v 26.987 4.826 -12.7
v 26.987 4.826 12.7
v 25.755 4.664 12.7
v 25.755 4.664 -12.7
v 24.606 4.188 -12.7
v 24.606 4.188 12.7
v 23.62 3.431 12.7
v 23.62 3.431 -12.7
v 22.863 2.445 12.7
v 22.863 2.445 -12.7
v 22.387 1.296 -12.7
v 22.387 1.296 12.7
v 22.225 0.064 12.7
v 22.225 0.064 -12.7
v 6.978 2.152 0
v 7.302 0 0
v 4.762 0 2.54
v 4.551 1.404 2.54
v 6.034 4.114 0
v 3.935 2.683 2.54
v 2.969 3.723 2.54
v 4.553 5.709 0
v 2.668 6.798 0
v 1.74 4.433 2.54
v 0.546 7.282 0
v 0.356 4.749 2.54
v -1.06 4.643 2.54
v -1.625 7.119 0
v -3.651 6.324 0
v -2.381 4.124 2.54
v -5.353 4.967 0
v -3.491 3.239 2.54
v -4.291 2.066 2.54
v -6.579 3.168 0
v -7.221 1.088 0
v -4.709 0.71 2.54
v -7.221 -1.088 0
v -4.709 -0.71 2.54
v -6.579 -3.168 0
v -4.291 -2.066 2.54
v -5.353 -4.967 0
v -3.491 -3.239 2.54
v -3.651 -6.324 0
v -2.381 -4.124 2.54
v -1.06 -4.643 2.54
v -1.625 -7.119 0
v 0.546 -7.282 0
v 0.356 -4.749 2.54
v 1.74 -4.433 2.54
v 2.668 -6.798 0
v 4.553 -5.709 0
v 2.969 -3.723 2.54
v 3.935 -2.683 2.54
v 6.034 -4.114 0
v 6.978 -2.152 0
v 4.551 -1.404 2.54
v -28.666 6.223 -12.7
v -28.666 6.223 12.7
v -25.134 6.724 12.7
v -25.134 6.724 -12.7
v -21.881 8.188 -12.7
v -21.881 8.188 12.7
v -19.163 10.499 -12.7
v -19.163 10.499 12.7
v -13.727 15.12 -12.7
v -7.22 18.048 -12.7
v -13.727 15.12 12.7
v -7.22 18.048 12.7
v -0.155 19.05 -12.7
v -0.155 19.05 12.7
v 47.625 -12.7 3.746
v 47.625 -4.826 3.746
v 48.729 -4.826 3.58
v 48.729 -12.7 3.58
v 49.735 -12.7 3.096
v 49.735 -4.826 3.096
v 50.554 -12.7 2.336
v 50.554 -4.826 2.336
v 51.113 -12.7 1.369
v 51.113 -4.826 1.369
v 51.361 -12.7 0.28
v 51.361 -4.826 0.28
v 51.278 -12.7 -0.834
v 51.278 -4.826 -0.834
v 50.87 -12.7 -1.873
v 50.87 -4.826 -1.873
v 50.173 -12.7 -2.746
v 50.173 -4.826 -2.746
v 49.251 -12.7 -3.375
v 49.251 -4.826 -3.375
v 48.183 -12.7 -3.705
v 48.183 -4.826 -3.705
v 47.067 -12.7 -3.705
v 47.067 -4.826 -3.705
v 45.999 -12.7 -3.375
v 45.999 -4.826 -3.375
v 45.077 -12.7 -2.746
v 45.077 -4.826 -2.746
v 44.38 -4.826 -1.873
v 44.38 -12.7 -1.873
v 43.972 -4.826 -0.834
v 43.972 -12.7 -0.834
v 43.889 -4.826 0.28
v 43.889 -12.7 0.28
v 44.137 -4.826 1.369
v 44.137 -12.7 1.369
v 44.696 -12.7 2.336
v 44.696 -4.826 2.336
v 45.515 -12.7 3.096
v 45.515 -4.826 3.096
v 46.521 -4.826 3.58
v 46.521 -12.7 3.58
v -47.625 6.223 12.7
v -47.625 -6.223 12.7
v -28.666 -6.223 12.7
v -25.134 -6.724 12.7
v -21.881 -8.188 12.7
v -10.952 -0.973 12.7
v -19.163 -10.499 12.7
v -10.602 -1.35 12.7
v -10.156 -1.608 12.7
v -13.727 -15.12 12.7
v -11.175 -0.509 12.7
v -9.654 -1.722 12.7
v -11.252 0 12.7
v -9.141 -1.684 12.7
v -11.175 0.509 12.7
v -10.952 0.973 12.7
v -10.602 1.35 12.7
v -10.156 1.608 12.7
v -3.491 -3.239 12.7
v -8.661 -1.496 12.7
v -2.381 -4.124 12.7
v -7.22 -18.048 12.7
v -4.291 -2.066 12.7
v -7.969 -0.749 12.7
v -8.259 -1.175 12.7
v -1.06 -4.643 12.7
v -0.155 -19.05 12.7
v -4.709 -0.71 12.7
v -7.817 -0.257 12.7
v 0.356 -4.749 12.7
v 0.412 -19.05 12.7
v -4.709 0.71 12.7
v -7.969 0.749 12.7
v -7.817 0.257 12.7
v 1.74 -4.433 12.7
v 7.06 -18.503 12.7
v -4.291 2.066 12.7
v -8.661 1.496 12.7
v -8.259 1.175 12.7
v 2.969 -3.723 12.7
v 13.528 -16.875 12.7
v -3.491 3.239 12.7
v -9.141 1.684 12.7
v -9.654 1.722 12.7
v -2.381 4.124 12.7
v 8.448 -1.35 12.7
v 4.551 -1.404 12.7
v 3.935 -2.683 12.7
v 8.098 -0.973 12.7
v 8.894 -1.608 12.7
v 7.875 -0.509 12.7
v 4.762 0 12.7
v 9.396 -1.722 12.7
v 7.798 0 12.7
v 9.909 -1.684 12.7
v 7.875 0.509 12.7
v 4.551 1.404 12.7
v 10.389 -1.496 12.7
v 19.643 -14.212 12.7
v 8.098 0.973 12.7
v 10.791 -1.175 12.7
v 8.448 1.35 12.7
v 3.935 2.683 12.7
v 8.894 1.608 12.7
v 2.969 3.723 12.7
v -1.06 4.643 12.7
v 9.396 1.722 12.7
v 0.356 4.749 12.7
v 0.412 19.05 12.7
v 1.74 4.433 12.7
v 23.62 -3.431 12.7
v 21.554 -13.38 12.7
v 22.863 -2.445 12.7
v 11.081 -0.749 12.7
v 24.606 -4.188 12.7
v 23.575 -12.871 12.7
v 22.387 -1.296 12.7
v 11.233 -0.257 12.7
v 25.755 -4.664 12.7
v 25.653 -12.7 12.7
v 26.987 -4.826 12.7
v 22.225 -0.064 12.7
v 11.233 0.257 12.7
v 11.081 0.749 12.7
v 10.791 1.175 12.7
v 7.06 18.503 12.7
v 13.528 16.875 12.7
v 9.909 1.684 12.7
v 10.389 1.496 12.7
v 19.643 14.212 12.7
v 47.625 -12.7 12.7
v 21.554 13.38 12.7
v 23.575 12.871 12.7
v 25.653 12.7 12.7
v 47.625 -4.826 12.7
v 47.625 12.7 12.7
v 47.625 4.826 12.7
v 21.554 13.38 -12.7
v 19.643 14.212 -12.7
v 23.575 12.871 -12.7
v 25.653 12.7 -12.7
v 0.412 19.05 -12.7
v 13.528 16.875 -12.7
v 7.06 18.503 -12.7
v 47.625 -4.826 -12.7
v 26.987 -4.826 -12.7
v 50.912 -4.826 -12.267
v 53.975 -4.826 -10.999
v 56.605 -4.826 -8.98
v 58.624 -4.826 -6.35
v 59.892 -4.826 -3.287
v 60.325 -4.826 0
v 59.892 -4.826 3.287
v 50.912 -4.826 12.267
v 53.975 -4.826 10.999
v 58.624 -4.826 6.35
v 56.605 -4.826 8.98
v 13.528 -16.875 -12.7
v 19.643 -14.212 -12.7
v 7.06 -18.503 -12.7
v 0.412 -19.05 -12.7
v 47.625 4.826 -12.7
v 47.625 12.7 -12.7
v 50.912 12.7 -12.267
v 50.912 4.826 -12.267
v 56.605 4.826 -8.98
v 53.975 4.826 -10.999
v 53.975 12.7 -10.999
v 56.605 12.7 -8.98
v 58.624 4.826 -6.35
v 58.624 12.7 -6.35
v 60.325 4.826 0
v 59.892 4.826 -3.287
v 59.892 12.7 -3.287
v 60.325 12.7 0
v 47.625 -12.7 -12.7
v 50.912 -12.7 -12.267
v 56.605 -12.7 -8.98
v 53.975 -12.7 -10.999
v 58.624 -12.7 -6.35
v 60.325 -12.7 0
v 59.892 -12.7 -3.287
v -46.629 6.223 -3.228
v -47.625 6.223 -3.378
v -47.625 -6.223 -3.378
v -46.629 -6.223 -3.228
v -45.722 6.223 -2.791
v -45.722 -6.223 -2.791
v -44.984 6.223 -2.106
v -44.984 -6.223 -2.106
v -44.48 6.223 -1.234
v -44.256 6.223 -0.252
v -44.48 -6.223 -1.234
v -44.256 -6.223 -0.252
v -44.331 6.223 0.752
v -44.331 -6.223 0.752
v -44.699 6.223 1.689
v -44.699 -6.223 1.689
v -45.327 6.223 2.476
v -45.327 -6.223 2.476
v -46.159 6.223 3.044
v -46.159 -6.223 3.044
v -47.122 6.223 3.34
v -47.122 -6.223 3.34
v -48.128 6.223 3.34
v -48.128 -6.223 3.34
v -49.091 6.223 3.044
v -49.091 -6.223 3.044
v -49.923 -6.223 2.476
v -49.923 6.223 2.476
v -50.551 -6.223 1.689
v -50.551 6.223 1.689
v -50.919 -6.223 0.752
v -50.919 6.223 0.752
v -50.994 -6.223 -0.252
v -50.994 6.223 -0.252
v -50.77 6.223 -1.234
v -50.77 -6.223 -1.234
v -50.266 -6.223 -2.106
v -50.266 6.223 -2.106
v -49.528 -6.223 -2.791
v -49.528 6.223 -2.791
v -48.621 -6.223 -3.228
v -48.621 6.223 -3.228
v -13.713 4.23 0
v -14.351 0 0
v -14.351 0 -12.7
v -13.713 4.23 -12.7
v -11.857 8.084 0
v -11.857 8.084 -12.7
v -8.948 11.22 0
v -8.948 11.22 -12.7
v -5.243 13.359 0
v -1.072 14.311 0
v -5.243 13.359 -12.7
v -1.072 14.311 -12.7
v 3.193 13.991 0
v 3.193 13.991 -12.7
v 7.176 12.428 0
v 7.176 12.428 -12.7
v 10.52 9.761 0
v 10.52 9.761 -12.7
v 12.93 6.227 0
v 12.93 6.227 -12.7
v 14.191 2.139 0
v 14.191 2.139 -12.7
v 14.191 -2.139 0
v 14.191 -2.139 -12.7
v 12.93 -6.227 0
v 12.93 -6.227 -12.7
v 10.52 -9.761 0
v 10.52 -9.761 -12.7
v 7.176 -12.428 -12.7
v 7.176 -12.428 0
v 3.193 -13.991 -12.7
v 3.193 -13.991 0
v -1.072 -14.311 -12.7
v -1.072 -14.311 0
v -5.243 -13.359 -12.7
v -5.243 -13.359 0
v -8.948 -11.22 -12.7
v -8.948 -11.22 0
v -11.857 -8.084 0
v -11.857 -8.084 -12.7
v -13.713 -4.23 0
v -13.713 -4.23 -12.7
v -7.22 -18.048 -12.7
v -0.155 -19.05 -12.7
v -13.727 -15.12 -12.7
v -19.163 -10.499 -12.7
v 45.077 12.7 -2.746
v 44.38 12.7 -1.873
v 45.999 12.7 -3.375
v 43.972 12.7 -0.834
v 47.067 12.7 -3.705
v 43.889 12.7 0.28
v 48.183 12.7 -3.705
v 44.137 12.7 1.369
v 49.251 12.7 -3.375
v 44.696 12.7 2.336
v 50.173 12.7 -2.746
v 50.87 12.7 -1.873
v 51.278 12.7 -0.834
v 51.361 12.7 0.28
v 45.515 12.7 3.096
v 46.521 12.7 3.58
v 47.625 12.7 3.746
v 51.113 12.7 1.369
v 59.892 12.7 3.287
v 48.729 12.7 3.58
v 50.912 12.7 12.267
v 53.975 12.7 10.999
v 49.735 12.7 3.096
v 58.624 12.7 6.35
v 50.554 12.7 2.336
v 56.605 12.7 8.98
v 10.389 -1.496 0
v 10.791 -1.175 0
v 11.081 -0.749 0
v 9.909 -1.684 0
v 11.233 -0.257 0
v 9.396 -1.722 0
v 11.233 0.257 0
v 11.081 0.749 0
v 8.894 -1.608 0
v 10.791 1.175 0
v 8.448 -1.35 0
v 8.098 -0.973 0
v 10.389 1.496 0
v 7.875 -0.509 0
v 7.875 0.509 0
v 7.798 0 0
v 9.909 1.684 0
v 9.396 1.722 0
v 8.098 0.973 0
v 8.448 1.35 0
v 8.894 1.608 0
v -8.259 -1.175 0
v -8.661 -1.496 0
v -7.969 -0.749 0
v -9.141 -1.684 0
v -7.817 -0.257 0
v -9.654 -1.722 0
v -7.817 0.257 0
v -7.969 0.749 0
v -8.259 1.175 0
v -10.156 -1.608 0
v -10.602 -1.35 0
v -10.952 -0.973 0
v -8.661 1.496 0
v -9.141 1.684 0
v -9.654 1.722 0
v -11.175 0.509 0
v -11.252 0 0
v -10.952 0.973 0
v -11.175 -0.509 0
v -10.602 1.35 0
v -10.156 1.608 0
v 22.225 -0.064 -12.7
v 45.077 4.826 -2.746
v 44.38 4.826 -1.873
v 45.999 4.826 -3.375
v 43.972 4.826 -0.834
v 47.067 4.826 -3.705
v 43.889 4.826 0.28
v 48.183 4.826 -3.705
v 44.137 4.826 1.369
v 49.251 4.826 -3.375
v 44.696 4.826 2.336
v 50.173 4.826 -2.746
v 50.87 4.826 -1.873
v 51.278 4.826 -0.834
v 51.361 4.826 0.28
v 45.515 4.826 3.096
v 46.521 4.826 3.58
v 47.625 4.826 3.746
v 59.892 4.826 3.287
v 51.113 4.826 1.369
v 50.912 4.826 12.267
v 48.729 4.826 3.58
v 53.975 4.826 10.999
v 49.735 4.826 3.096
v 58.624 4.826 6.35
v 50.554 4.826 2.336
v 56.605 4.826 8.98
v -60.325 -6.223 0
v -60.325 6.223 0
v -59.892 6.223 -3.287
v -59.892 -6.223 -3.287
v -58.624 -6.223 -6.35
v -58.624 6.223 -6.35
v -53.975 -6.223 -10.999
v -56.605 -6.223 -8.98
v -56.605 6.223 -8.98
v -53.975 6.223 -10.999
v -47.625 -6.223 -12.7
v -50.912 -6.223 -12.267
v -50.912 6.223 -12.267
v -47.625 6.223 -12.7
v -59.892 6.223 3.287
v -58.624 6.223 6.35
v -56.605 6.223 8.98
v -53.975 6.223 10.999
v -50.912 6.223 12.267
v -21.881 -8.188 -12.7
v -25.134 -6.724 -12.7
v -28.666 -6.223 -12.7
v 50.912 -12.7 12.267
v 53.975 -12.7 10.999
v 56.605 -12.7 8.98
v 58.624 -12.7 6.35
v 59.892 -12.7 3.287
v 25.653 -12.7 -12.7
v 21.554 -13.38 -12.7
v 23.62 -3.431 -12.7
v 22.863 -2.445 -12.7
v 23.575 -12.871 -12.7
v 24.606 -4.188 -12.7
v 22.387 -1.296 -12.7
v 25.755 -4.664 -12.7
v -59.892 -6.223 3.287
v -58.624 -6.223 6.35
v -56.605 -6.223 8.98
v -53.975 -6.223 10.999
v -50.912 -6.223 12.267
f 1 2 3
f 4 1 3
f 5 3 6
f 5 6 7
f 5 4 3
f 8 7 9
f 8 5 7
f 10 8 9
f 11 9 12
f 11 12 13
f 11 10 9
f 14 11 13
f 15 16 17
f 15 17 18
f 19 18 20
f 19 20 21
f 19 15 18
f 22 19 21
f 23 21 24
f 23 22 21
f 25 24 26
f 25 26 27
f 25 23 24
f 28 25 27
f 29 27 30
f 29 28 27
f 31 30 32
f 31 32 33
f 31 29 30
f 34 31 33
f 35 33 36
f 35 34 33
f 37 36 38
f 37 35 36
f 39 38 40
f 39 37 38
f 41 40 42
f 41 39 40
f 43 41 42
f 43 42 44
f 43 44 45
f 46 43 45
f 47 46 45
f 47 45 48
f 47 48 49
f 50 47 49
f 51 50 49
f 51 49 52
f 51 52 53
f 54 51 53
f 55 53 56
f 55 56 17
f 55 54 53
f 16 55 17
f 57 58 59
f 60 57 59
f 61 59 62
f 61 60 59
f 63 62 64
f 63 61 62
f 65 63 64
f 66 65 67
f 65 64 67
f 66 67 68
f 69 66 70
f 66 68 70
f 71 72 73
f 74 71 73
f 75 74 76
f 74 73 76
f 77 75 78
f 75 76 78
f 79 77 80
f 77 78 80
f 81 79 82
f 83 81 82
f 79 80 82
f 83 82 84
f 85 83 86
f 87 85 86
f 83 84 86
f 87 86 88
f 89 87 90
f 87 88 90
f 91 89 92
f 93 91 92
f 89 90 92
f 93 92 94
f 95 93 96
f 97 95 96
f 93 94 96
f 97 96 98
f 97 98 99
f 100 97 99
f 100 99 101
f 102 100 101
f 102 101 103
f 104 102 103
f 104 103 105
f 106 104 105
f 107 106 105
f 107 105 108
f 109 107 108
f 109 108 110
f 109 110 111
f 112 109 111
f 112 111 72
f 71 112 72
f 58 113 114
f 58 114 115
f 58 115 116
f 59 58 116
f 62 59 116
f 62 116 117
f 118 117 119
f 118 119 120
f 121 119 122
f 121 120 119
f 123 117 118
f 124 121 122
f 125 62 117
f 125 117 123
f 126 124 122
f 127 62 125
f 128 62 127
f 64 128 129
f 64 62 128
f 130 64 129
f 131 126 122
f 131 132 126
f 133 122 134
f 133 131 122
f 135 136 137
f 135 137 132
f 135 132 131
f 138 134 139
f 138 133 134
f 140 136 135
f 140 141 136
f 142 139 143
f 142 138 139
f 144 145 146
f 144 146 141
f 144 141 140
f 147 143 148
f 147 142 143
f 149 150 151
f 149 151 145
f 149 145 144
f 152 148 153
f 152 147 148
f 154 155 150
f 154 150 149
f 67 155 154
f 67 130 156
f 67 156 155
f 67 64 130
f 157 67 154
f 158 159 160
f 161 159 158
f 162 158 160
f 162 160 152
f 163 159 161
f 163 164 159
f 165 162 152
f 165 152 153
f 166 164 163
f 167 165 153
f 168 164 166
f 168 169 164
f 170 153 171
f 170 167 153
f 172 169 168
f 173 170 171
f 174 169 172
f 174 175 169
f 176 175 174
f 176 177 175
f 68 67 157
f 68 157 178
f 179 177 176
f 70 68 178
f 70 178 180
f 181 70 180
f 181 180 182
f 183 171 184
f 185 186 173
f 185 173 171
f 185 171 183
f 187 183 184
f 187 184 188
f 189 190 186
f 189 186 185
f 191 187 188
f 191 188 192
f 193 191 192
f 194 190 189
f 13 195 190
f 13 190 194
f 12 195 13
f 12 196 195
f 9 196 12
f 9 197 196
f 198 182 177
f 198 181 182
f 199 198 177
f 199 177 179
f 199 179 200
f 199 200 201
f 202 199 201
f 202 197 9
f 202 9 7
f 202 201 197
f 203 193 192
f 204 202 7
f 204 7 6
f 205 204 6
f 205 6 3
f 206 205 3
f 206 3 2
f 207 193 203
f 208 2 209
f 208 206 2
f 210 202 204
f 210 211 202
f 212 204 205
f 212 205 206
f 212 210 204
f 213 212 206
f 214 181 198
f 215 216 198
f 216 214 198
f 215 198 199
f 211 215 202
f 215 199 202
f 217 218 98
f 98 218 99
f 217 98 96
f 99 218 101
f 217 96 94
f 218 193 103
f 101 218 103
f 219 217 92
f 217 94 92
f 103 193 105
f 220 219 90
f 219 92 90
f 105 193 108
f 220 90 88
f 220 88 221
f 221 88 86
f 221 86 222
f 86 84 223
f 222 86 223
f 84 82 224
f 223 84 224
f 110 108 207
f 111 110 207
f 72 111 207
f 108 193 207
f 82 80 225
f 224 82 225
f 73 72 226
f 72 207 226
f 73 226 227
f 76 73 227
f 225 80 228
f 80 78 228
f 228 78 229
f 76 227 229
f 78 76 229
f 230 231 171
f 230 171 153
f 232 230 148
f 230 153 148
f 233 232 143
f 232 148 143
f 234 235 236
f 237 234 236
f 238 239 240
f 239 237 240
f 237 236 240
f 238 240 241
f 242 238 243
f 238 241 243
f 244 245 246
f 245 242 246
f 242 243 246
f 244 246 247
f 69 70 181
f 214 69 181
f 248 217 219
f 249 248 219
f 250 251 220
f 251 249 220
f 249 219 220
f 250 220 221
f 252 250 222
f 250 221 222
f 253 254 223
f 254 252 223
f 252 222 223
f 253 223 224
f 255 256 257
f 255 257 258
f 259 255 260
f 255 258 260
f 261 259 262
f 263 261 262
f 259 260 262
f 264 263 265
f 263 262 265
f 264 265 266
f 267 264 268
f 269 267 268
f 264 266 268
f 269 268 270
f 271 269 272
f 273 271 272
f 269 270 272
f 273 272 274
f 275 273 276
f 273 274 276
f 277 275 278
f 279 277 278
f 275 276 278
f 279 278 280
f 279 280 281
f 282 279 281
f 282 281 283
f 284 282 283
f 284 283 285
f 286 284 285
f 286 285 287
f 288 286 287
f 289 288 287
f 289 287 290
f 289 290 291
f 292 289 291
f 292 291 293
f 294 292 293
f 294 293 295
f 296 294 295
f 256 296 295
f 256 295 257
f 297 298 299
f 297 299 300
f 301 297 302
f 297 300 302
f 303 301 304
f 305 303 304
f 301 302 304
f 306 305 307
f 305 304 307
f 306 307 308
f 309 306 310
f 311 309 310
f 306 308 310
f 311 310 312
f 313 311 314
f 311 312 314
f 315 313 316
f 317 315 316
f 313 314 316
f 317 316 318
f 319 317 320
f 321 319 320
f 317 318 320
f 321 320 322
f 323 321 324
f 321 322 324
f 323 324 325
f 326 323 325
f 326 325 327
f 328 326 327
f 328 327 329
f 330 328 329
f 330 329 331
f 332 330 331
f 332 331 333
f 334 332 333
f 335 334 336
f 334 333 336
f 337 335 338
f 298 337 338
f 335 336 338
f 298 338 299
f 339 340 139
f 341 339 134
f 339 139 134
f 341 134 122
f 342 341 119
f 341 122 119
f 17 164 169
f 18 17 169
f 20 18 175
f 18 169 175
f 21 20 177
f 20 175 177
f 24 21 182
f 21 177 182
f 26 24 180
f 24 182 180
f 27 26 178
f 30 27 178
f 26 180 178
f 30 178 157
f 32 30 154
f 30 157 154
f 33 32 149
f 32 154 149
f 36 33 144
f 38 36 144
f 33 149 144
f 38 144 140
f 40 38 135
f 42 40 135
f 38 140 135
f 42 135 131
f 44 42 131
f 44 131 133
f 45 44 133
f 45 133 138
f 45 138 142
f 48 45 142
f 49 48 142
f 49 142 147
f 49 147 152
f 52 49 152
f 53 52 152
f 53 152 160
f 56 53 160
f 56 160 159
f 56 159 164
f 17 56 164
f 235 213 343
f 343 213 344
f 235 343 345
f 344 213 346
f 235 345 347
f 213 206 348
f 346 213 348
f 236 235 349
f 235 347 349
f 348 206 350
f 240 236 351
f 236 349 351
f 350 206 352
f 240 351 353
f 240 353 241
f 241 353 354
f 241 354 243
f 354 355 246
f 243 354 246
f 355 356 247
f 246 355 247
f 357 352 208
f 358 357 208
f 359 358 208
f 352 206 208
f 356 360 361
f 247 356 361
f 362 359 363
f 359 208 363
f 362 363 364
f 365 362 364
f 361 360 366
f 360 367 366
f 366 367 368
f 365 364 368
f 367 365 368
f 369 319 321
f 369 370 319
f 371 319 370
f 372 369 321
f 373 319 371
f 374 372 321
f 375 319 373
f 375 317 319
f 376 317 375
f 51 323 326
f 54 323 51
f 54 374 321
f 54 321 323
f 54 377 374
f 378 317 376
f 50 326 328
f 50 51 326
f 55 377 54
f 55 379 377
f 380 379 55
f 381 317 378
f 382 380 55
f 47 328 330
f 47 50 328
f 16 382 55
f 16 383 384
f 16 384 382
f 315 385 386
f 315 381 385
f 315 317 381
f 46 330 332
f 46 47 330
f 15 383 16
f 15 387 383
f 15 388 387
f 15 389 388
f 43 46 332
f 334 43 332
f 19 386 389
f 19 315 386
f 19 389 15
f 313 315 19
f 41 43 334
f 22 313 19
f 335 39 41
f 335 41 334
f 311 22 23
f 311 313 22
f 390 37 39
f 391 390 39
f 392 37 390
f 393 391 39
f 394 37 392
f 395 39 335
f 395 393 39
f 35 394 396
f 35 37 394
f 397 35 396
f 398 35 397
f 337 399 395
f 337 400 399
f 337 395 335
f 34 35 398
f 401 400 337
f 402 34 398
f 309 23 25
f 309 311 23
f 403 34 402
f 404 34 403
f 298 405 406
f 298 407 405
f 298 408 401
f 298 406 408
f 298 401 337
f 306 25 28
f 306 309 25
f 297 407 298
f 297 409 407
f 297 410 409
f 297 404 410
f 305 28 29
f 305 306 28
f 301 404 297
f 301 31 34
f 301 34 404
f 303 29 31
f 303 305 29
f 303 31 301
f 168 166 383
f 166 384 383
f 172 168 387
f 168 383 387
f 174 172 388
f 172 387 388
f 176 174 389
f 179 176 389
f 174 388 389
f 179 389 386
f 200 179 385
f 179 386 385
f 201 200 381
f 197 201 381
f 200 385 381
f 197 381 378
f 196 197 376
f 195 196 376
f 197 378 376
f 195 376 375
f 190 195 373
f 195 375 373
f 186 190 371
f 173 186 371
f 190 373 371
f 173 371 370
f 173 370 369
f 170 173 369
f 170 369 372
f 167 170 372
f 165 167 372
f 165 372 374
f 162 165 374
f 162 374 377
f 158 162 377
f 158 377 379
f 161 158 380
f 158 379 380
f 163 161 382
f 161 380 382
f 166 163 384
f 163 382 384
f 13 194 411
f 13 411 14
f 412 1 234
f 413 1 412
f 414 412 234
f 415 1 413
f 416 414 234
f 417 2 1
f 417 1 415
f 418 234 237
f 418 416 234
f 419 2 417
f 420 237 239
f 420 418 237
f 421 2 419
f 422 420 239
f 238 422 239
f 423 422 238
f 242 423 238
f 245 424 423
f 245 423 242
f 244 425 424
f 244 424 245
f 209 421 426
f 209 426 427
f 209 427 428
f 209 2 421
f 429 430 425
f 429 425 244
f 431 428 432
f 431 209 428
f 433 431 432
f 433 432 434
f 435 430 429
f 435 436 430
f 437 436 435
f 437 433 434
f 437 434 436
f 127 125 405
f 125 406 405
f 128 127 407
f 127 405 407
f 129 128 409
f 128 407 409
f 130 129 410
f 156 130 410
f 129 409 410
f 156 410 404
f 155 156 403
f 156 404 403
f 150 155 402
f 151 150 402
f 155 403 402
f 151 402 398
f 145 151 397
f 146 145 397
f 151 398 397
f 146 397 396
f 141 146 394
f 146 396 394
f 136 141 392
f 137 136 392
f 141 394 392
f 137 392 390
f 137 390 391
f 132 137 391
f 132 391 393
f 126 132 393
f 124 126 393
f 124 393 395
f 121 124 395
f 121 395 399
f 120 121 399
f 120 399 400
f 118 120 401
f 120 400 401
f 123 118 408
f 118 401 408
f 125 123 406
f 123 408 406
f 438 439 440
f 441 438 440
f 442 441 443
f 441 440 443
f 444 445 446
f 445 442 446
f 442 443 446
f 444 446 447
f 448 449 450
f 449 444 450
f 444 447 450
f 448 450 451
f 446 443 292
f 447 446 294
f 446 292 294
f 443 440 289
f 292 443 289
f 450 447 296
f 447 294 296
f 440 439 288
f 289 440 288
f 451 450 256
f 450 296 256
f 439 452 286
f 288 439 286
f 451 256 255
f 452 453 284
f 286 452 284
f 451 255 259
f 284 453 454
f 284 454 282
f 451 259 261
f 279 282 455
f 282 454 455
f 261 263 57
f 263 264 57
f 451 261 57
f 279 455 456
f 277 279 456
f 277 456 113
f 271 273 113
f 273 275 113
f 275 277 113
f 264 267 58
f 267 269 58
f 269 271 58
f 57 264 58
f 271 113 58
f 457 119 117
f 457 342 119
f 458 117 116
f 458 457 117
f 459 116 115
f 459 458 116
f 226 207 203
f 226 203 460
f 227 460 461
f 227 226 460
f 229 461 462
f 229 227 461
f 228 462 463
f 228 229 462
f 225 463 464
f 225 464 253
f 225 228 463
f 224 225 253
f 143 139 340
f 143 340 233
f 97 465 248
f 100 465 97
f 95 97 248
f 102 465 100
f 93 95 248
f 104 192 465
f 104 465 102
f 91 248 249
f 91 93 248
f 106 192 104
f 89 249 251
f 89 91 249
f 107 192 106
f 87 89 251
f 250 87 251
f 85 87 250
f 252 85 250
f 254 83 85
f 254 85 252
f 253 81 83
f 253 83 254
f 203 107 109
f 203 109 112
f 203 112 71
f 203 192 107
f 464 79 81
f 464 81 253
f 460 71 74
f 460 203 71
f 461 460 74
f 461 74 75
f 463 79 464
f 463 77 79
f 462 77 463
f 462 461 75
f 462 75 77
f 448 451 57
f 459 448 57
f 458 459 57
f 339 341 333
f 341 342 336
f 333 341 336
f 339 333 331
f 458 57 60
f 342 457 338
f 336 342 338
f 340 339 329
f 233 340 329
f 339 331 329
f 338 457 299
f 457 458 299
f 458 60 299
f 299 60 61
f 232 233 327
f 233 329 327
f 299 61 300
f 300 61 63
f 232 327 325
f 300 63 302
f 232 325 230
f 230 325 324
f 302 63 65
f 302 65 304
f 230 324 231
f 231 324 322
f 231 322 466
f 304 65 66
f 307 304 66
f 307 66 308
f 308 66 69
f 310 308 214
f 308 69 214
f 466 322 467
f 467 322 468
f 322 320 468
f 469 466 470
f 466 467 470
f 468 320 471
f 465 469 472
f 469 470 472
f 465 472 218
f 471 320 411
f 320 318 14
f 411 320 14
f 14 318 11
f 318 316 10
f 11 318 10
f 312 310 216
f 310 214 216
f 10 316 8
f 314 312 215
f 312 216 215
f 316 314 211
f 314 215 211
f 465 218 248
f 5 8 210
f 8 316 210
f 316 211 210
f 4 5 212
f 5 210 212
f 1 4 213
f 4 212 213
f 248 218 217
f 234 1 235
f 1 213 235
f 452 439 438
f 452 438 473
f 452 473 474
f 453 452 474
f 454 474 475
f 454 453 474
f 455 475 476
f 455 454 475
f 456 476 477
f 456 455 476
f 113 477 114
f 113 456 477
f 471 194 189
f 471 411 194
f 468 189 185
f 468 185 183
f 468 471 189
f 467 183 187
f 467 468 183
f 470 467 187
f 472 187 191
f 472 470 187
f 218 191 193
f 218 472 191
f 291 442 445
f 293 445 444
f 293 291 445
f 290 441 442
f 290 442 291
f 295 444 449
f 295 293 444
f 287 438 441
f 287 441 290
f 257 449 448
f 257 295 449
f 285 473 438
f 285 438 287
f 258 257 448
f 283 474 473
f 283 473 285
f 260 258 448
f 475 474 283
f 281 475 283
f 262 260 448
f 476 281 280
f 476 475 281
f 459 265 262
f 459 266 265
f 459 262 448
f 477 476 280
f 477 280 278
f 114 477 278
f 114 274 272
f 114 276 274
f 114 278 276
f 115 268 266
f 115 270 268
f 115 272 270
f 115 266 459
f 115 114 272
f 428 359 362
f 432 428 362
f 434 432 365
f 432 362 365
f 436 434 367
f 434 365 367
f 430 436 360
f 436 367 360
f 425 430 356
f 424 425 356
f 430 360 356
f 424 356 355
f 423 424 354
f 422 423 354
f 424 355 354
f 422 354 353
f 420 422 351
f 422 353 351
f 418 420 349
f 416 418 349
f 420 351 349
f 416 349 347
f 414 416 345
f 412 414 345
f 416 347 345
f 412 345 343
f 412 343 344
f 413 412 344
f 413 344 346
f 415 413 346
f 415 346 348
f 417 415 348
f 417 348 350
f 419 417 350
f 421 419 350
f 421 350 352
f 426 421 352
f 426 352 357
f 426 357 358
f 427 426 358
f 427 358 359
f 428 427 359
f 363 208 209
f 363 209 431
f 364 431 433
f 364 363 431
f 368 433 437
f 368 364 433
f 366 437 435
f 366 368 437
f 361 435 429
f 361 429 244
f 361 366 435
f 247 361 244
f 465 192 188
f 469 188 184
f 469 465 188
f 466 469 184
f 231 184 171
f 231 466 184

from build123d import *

# Parameters (mm, degrees)
SKETCH1_W                   = 120.65
SKETCH1_H                   = 38.1
BOSS_EXTRUDE1_DEPTH         = 12.7
SKETCH2_R                   = 14.351
CUT_EXTRUDE1_DEPTH          = 12.7
F_8_32_TAPPED_HOLE1_D       = 3.4544
F_8_32_TAPPED_HOLE1_DEPTH   = 12.7
F_8_32_TAPPED_HOLE1_TIP     = 1.037806461
CUT_EXTRUDE2_REACH          = 70.17
SKETCH7_R                   = 4.7625
FILLET1_R                   = 12.7
SKETCH12_W                  = 38.1
SKETCH12_H                  = 12.827
SKETCH12_H_2                = 9.652
SKETCH12_H_3                = 6.35
CUT_EXTRUDE6_DEPTH          = 69.170141008
SKETCH13_R                  = 3.7465
CUT_EXTRUDE7_DEPTH          = 73.470722537
F_1_4_CLEARANCE_HOLE1_D     = 6.7564
F_1_4_CLEARANCE_HOLE1_DEPTH = 19.05
F_1_4_CLEARANCE_HOLE1_TIP   = 2.029827343
CHAMFER1_SIZE               = 2.54
FILLET2_R                   = 25.4
FILLET3_R                   = 12.7
FILLET4_R                   = 40.64
FILLET5_R                   = 12.7
FILLET6_R                   = 4.7625


# Some blends are built 0.0001 mm under size
with BuildPart() as part:
    # Sketch1 → Boss-Extrude1 (new, symmetric)
    with BuildSketch(Plane.XY):
        Rectangle(SKETCH1_W, SKETCH1_H)
    extrude(amount=BOSS_EXTRUDE1_DEPTH, both=True)

    # Sketch2 → Cut-Extrude1 (cut)
    with BuildSketch(Plane(origin=(0, 0, -12.7), x_dir=(-1, 0, 0), z_dir=(0, 0, -1))):
        Circle(SKETCH2_R)
    extrude(amount=-CUT_EXTRUDE1_DEPTH, mode=Mode.SUBTRACT)

    # #8-32 Tapped Hole1
    with Locations(Plane.XY.offset(12.7)):
        with Locations((9.525, 0), (-9.525, 0)):
            Hole(F_8_32_TAPPED_HOLE1_D / 2, depth=F_8_32_TAPPED_HOLE1_DEPTH)
            with Locations((0, 0, -(F_8_32_TAPPED_HOLE1_DEPTH + F_8_32_TAPPED_HOLE1_TIP / 2))):  # 118° drill point
                Cone(0, F_8_32_TAPPED_HOLE1_D / 2, F_8_32_TAPPED_HOLE1_TIP, mode=Mode.SUBTRACT)

    # Sketch7 → Cut-Extrude2 (cut, up to next)
    with BuildSketch(Plane.XY.offset(12.7), mode=Mode.PRIVATE) as cut_extrude2_sk1:
        Circle(SKETCH7_R)
    cut_extrude2_tool1 = extrude(cut_extrude2_sk1.sketch, amount=-CUT_EXTRUDE2_REACH, mode=Mode.PRIVATE) & part.part
    add(cut_extrude2_tool1.solids().sort_by_distance((0, 0, 12.7))[0], mode=Mode.SUBTRACT)

    # Fillet1
    fillet1_edges = [part.edges().sort_by_distance(p)[0] for p in [
        (-60.325, 0, 12.7),
        (-60.325, 0, -12.7),
        (60.325, 0, 12.7),
        (60.325, 0, -12.7),
    ]]
    fillet(fillet1_edges, radius=FILLET1_R - 0.0001)  # a hair under: the kernel refuses the full size

    # Sketch12 → Cut-Extrude6 (cut, through all)
    with BuildSketch(Plane.XY.offset(12.7)):
        with Locations((-41.275, 12.6365)):
            Rectangle(SKETCH12_W, SKETCH12_H)
        with Locations((41.275, 0)):
            Rectangle(SKETCH12_W, SKETCH12_H_2)
        with Locations((-41.275, -12.6365)):
            Rectangle(SKETCH12_W, SKETCH12_H)
        with Locations((41.275, 15.875)):
            Rectangle(SKETCH12_W, SKETCH12_H_3)
        with Locations((41.275, -15.875)):
            Rectangle(SKETCH12_W, SKETCH12_H_3)
    extrude(amount=-CUT_EXTRUDE6_DEPTH, mode=Mode.SUBTRACT)

    # Sketch13 → Cut-Extrude7 (cut, through all)
    with BuildSketch(Plane(origin=(0, 19.05, 0), x_dir=(1, 0, 0), z_dir=(0, 1, 0))):
        with Locations(Location((47.625, 0, 0), (0, 0, 270))):
            Circle(SKETCH13_R)
    extrude(amount=-CUT_EXTRUDE7_DEPTH, mode=Mode.SUBTRACT)

    # 1/4 Clearance Hole1
    with Locations(Plane(origin=(0, 9.525, -30.597499938), x_dir=(0, 0, 1), z_dir=(0, 1, 0))):
        with Locations((30.597499938, -47.625), (62.347499938, -47.625), (81.397499938, -47.625), (196.332499938, -47.625)):
            Hole(F_1_4_CLEARANCE_HOLE1_D / 2, depth=F_1_4_CLEARANCE_HOLE1_DEPTH)
            with Locations((0, 0, -(F_1_4_CLEARANCE_HOLE1_DEPTH + F_1_4_CLEARANCE_HOLE1_TIP / 2))):  # 118° drill point
                Cone(0, F_1_4_CLEARANCE_HOLE1_D / 2, F_1_4_CLEARANCE_HOLE1_TIP, mode=Mode.SUBTRACT)

    # Chamfer1
    chamfer1_edges = [part.edges().sort_by_distance(p)[0] for p in [
        (-4.7625, 0, 0),
    ]]
    chamfer(chamfer1_edges, length=CHAMFER1_SIZE)

    # Fillet2
    # the kernel refuses this fillet: 25.4 mm, written as the material it takes off along each edge
    with BuildSketch(Plane(origin=(-22.225, -19.05, 67.874703839), x_dir=(0, 1, 0), z_dir=(0, 0, -1))) as fillet2_piece_1:
        with BuildLine():
            CenterArc((25.4, 22.069881536), FILLET2_R, 180, 60.330249663)
            Line((0, 22.069881536), (-0.508, 22.069881536))
            Line((-0.508, 22.069881536), (-0.508, 0))
            Line((-0.508, 0), (0, -0.508))
            ThreePointArc((0, -0.508), (6.4135, -0.508), (12.57554, -0.441397631))
            Line((12.57554, -0.441397631), (12.827, 0))
        make_face()
    extrude(amount=135.749407679, mode=Mode.SUBTRACT)
    with BuildSketch(Plane(origin=(-22.225, 19.05, 67.874703839), x_dir=(0, -1, 0), z_dir=(0, 0, -1))) as fillet2_piece_2:
        with BuildLine():
            CenterArc((25.4, -22.069881536), FILLET2_R, 119.669750337, 60.330249663)
            Line((0, -22.069881536), (-0.508, -22.069881536))
            Line((-0.508, -22.069881536), (-0.508, 0))
            Line((-0.508, 0), (0, 0.508))
            ThreePointArc((0, 0.508), (6.4135, 0.508), (12.57554, 0.441397631))
            Line((12.57554, 0.441397631), (12.827, 0))
        make_face()
    extrude(amount=135.749407679, mode=Mode.SUBTRACT)

    # Fillet3
    fillet3_edges = [part.edges().sort_by_distance(p)[0] for p in [
        (-22.225, 6.223, 0),
        (-22.225, -6.223, 0),
    ]]
    fillet(fillet3_edges, radius=FILLET3_R)

    # Fillet4
    # the kernel refuses this fillet: 40.64 mm, written as the material it takes off along each edge
    with BuildSketch(Plane(origin=(22.225, -19.05, 67.232415818), x_dir=(-1, 0, 0), z_dir=(0, 0, -1))) as fillet4_piece_1:
        with BuildLine():
            CenterArc((21.812966327, 40.64), FILLET4_R, 237.538255033, 32.461744967)
            Line((0, 6.35), (-0.436259327, 5.6642))
            ThreePointArc((-0.436259327, 5.6642), (-0.8128, 3.175), (-0.8128, 0))
            Line((-0.8128, 0), (0, -0.8128))
            Line((0, -0.8128), (21.812966327, -0.8128))
            Line((21.812966327, -0.8128), (21.812966327, 0))
        make_face()
    extrude(amount=134.464831637, mode=Mode.SUBTRACT)
    with BuildSketch(Plane(origin=(22.225, 19.05, 67.232415818), x_dir=(-1, 0, 0), z_dir=(0, 0, -1))) as fillet4_piece_2:
        with BuildLine():
            CenterArc((21.812966327, -40.64), FILLET4_R, 90, 32.461744967)
            Line((0, -6.35), (-0.436259327, -5.6642))
            ThreePointArc((-0.436259327, -5.6642), (-0.8128, -3.175), (-0.8128, 0))
            Line((-0.8128, 0), (0, 0.8128))
            Line((0, 0.8128), (21.812966327, 0.8128))
            Line((21.812966327, 0.8128), (21.812966327, 0))
        make_face()
    extrude(amount=134.464831637, mode=Mode.SUBTRACT)

    # Fillet5
    fillet5_edges = [part.edges().sort_by_distance(p)[0] for p in [
        (22.225, 12.7, 0),
        (22.225, -12.7, 0),
    ]]
    fillet(fillet5_edges, radius=FILLET5_R)

    # Fillet6
    fillet6_edges = [part.edges().sort_by_distance(p)[0] for p in [
        (22.225, -4.826, 0),
        (22.225, 4.826, 0),
    ]]
    fillet(fillet6_edges, radius=FILLET6_R)


solid = part.part
